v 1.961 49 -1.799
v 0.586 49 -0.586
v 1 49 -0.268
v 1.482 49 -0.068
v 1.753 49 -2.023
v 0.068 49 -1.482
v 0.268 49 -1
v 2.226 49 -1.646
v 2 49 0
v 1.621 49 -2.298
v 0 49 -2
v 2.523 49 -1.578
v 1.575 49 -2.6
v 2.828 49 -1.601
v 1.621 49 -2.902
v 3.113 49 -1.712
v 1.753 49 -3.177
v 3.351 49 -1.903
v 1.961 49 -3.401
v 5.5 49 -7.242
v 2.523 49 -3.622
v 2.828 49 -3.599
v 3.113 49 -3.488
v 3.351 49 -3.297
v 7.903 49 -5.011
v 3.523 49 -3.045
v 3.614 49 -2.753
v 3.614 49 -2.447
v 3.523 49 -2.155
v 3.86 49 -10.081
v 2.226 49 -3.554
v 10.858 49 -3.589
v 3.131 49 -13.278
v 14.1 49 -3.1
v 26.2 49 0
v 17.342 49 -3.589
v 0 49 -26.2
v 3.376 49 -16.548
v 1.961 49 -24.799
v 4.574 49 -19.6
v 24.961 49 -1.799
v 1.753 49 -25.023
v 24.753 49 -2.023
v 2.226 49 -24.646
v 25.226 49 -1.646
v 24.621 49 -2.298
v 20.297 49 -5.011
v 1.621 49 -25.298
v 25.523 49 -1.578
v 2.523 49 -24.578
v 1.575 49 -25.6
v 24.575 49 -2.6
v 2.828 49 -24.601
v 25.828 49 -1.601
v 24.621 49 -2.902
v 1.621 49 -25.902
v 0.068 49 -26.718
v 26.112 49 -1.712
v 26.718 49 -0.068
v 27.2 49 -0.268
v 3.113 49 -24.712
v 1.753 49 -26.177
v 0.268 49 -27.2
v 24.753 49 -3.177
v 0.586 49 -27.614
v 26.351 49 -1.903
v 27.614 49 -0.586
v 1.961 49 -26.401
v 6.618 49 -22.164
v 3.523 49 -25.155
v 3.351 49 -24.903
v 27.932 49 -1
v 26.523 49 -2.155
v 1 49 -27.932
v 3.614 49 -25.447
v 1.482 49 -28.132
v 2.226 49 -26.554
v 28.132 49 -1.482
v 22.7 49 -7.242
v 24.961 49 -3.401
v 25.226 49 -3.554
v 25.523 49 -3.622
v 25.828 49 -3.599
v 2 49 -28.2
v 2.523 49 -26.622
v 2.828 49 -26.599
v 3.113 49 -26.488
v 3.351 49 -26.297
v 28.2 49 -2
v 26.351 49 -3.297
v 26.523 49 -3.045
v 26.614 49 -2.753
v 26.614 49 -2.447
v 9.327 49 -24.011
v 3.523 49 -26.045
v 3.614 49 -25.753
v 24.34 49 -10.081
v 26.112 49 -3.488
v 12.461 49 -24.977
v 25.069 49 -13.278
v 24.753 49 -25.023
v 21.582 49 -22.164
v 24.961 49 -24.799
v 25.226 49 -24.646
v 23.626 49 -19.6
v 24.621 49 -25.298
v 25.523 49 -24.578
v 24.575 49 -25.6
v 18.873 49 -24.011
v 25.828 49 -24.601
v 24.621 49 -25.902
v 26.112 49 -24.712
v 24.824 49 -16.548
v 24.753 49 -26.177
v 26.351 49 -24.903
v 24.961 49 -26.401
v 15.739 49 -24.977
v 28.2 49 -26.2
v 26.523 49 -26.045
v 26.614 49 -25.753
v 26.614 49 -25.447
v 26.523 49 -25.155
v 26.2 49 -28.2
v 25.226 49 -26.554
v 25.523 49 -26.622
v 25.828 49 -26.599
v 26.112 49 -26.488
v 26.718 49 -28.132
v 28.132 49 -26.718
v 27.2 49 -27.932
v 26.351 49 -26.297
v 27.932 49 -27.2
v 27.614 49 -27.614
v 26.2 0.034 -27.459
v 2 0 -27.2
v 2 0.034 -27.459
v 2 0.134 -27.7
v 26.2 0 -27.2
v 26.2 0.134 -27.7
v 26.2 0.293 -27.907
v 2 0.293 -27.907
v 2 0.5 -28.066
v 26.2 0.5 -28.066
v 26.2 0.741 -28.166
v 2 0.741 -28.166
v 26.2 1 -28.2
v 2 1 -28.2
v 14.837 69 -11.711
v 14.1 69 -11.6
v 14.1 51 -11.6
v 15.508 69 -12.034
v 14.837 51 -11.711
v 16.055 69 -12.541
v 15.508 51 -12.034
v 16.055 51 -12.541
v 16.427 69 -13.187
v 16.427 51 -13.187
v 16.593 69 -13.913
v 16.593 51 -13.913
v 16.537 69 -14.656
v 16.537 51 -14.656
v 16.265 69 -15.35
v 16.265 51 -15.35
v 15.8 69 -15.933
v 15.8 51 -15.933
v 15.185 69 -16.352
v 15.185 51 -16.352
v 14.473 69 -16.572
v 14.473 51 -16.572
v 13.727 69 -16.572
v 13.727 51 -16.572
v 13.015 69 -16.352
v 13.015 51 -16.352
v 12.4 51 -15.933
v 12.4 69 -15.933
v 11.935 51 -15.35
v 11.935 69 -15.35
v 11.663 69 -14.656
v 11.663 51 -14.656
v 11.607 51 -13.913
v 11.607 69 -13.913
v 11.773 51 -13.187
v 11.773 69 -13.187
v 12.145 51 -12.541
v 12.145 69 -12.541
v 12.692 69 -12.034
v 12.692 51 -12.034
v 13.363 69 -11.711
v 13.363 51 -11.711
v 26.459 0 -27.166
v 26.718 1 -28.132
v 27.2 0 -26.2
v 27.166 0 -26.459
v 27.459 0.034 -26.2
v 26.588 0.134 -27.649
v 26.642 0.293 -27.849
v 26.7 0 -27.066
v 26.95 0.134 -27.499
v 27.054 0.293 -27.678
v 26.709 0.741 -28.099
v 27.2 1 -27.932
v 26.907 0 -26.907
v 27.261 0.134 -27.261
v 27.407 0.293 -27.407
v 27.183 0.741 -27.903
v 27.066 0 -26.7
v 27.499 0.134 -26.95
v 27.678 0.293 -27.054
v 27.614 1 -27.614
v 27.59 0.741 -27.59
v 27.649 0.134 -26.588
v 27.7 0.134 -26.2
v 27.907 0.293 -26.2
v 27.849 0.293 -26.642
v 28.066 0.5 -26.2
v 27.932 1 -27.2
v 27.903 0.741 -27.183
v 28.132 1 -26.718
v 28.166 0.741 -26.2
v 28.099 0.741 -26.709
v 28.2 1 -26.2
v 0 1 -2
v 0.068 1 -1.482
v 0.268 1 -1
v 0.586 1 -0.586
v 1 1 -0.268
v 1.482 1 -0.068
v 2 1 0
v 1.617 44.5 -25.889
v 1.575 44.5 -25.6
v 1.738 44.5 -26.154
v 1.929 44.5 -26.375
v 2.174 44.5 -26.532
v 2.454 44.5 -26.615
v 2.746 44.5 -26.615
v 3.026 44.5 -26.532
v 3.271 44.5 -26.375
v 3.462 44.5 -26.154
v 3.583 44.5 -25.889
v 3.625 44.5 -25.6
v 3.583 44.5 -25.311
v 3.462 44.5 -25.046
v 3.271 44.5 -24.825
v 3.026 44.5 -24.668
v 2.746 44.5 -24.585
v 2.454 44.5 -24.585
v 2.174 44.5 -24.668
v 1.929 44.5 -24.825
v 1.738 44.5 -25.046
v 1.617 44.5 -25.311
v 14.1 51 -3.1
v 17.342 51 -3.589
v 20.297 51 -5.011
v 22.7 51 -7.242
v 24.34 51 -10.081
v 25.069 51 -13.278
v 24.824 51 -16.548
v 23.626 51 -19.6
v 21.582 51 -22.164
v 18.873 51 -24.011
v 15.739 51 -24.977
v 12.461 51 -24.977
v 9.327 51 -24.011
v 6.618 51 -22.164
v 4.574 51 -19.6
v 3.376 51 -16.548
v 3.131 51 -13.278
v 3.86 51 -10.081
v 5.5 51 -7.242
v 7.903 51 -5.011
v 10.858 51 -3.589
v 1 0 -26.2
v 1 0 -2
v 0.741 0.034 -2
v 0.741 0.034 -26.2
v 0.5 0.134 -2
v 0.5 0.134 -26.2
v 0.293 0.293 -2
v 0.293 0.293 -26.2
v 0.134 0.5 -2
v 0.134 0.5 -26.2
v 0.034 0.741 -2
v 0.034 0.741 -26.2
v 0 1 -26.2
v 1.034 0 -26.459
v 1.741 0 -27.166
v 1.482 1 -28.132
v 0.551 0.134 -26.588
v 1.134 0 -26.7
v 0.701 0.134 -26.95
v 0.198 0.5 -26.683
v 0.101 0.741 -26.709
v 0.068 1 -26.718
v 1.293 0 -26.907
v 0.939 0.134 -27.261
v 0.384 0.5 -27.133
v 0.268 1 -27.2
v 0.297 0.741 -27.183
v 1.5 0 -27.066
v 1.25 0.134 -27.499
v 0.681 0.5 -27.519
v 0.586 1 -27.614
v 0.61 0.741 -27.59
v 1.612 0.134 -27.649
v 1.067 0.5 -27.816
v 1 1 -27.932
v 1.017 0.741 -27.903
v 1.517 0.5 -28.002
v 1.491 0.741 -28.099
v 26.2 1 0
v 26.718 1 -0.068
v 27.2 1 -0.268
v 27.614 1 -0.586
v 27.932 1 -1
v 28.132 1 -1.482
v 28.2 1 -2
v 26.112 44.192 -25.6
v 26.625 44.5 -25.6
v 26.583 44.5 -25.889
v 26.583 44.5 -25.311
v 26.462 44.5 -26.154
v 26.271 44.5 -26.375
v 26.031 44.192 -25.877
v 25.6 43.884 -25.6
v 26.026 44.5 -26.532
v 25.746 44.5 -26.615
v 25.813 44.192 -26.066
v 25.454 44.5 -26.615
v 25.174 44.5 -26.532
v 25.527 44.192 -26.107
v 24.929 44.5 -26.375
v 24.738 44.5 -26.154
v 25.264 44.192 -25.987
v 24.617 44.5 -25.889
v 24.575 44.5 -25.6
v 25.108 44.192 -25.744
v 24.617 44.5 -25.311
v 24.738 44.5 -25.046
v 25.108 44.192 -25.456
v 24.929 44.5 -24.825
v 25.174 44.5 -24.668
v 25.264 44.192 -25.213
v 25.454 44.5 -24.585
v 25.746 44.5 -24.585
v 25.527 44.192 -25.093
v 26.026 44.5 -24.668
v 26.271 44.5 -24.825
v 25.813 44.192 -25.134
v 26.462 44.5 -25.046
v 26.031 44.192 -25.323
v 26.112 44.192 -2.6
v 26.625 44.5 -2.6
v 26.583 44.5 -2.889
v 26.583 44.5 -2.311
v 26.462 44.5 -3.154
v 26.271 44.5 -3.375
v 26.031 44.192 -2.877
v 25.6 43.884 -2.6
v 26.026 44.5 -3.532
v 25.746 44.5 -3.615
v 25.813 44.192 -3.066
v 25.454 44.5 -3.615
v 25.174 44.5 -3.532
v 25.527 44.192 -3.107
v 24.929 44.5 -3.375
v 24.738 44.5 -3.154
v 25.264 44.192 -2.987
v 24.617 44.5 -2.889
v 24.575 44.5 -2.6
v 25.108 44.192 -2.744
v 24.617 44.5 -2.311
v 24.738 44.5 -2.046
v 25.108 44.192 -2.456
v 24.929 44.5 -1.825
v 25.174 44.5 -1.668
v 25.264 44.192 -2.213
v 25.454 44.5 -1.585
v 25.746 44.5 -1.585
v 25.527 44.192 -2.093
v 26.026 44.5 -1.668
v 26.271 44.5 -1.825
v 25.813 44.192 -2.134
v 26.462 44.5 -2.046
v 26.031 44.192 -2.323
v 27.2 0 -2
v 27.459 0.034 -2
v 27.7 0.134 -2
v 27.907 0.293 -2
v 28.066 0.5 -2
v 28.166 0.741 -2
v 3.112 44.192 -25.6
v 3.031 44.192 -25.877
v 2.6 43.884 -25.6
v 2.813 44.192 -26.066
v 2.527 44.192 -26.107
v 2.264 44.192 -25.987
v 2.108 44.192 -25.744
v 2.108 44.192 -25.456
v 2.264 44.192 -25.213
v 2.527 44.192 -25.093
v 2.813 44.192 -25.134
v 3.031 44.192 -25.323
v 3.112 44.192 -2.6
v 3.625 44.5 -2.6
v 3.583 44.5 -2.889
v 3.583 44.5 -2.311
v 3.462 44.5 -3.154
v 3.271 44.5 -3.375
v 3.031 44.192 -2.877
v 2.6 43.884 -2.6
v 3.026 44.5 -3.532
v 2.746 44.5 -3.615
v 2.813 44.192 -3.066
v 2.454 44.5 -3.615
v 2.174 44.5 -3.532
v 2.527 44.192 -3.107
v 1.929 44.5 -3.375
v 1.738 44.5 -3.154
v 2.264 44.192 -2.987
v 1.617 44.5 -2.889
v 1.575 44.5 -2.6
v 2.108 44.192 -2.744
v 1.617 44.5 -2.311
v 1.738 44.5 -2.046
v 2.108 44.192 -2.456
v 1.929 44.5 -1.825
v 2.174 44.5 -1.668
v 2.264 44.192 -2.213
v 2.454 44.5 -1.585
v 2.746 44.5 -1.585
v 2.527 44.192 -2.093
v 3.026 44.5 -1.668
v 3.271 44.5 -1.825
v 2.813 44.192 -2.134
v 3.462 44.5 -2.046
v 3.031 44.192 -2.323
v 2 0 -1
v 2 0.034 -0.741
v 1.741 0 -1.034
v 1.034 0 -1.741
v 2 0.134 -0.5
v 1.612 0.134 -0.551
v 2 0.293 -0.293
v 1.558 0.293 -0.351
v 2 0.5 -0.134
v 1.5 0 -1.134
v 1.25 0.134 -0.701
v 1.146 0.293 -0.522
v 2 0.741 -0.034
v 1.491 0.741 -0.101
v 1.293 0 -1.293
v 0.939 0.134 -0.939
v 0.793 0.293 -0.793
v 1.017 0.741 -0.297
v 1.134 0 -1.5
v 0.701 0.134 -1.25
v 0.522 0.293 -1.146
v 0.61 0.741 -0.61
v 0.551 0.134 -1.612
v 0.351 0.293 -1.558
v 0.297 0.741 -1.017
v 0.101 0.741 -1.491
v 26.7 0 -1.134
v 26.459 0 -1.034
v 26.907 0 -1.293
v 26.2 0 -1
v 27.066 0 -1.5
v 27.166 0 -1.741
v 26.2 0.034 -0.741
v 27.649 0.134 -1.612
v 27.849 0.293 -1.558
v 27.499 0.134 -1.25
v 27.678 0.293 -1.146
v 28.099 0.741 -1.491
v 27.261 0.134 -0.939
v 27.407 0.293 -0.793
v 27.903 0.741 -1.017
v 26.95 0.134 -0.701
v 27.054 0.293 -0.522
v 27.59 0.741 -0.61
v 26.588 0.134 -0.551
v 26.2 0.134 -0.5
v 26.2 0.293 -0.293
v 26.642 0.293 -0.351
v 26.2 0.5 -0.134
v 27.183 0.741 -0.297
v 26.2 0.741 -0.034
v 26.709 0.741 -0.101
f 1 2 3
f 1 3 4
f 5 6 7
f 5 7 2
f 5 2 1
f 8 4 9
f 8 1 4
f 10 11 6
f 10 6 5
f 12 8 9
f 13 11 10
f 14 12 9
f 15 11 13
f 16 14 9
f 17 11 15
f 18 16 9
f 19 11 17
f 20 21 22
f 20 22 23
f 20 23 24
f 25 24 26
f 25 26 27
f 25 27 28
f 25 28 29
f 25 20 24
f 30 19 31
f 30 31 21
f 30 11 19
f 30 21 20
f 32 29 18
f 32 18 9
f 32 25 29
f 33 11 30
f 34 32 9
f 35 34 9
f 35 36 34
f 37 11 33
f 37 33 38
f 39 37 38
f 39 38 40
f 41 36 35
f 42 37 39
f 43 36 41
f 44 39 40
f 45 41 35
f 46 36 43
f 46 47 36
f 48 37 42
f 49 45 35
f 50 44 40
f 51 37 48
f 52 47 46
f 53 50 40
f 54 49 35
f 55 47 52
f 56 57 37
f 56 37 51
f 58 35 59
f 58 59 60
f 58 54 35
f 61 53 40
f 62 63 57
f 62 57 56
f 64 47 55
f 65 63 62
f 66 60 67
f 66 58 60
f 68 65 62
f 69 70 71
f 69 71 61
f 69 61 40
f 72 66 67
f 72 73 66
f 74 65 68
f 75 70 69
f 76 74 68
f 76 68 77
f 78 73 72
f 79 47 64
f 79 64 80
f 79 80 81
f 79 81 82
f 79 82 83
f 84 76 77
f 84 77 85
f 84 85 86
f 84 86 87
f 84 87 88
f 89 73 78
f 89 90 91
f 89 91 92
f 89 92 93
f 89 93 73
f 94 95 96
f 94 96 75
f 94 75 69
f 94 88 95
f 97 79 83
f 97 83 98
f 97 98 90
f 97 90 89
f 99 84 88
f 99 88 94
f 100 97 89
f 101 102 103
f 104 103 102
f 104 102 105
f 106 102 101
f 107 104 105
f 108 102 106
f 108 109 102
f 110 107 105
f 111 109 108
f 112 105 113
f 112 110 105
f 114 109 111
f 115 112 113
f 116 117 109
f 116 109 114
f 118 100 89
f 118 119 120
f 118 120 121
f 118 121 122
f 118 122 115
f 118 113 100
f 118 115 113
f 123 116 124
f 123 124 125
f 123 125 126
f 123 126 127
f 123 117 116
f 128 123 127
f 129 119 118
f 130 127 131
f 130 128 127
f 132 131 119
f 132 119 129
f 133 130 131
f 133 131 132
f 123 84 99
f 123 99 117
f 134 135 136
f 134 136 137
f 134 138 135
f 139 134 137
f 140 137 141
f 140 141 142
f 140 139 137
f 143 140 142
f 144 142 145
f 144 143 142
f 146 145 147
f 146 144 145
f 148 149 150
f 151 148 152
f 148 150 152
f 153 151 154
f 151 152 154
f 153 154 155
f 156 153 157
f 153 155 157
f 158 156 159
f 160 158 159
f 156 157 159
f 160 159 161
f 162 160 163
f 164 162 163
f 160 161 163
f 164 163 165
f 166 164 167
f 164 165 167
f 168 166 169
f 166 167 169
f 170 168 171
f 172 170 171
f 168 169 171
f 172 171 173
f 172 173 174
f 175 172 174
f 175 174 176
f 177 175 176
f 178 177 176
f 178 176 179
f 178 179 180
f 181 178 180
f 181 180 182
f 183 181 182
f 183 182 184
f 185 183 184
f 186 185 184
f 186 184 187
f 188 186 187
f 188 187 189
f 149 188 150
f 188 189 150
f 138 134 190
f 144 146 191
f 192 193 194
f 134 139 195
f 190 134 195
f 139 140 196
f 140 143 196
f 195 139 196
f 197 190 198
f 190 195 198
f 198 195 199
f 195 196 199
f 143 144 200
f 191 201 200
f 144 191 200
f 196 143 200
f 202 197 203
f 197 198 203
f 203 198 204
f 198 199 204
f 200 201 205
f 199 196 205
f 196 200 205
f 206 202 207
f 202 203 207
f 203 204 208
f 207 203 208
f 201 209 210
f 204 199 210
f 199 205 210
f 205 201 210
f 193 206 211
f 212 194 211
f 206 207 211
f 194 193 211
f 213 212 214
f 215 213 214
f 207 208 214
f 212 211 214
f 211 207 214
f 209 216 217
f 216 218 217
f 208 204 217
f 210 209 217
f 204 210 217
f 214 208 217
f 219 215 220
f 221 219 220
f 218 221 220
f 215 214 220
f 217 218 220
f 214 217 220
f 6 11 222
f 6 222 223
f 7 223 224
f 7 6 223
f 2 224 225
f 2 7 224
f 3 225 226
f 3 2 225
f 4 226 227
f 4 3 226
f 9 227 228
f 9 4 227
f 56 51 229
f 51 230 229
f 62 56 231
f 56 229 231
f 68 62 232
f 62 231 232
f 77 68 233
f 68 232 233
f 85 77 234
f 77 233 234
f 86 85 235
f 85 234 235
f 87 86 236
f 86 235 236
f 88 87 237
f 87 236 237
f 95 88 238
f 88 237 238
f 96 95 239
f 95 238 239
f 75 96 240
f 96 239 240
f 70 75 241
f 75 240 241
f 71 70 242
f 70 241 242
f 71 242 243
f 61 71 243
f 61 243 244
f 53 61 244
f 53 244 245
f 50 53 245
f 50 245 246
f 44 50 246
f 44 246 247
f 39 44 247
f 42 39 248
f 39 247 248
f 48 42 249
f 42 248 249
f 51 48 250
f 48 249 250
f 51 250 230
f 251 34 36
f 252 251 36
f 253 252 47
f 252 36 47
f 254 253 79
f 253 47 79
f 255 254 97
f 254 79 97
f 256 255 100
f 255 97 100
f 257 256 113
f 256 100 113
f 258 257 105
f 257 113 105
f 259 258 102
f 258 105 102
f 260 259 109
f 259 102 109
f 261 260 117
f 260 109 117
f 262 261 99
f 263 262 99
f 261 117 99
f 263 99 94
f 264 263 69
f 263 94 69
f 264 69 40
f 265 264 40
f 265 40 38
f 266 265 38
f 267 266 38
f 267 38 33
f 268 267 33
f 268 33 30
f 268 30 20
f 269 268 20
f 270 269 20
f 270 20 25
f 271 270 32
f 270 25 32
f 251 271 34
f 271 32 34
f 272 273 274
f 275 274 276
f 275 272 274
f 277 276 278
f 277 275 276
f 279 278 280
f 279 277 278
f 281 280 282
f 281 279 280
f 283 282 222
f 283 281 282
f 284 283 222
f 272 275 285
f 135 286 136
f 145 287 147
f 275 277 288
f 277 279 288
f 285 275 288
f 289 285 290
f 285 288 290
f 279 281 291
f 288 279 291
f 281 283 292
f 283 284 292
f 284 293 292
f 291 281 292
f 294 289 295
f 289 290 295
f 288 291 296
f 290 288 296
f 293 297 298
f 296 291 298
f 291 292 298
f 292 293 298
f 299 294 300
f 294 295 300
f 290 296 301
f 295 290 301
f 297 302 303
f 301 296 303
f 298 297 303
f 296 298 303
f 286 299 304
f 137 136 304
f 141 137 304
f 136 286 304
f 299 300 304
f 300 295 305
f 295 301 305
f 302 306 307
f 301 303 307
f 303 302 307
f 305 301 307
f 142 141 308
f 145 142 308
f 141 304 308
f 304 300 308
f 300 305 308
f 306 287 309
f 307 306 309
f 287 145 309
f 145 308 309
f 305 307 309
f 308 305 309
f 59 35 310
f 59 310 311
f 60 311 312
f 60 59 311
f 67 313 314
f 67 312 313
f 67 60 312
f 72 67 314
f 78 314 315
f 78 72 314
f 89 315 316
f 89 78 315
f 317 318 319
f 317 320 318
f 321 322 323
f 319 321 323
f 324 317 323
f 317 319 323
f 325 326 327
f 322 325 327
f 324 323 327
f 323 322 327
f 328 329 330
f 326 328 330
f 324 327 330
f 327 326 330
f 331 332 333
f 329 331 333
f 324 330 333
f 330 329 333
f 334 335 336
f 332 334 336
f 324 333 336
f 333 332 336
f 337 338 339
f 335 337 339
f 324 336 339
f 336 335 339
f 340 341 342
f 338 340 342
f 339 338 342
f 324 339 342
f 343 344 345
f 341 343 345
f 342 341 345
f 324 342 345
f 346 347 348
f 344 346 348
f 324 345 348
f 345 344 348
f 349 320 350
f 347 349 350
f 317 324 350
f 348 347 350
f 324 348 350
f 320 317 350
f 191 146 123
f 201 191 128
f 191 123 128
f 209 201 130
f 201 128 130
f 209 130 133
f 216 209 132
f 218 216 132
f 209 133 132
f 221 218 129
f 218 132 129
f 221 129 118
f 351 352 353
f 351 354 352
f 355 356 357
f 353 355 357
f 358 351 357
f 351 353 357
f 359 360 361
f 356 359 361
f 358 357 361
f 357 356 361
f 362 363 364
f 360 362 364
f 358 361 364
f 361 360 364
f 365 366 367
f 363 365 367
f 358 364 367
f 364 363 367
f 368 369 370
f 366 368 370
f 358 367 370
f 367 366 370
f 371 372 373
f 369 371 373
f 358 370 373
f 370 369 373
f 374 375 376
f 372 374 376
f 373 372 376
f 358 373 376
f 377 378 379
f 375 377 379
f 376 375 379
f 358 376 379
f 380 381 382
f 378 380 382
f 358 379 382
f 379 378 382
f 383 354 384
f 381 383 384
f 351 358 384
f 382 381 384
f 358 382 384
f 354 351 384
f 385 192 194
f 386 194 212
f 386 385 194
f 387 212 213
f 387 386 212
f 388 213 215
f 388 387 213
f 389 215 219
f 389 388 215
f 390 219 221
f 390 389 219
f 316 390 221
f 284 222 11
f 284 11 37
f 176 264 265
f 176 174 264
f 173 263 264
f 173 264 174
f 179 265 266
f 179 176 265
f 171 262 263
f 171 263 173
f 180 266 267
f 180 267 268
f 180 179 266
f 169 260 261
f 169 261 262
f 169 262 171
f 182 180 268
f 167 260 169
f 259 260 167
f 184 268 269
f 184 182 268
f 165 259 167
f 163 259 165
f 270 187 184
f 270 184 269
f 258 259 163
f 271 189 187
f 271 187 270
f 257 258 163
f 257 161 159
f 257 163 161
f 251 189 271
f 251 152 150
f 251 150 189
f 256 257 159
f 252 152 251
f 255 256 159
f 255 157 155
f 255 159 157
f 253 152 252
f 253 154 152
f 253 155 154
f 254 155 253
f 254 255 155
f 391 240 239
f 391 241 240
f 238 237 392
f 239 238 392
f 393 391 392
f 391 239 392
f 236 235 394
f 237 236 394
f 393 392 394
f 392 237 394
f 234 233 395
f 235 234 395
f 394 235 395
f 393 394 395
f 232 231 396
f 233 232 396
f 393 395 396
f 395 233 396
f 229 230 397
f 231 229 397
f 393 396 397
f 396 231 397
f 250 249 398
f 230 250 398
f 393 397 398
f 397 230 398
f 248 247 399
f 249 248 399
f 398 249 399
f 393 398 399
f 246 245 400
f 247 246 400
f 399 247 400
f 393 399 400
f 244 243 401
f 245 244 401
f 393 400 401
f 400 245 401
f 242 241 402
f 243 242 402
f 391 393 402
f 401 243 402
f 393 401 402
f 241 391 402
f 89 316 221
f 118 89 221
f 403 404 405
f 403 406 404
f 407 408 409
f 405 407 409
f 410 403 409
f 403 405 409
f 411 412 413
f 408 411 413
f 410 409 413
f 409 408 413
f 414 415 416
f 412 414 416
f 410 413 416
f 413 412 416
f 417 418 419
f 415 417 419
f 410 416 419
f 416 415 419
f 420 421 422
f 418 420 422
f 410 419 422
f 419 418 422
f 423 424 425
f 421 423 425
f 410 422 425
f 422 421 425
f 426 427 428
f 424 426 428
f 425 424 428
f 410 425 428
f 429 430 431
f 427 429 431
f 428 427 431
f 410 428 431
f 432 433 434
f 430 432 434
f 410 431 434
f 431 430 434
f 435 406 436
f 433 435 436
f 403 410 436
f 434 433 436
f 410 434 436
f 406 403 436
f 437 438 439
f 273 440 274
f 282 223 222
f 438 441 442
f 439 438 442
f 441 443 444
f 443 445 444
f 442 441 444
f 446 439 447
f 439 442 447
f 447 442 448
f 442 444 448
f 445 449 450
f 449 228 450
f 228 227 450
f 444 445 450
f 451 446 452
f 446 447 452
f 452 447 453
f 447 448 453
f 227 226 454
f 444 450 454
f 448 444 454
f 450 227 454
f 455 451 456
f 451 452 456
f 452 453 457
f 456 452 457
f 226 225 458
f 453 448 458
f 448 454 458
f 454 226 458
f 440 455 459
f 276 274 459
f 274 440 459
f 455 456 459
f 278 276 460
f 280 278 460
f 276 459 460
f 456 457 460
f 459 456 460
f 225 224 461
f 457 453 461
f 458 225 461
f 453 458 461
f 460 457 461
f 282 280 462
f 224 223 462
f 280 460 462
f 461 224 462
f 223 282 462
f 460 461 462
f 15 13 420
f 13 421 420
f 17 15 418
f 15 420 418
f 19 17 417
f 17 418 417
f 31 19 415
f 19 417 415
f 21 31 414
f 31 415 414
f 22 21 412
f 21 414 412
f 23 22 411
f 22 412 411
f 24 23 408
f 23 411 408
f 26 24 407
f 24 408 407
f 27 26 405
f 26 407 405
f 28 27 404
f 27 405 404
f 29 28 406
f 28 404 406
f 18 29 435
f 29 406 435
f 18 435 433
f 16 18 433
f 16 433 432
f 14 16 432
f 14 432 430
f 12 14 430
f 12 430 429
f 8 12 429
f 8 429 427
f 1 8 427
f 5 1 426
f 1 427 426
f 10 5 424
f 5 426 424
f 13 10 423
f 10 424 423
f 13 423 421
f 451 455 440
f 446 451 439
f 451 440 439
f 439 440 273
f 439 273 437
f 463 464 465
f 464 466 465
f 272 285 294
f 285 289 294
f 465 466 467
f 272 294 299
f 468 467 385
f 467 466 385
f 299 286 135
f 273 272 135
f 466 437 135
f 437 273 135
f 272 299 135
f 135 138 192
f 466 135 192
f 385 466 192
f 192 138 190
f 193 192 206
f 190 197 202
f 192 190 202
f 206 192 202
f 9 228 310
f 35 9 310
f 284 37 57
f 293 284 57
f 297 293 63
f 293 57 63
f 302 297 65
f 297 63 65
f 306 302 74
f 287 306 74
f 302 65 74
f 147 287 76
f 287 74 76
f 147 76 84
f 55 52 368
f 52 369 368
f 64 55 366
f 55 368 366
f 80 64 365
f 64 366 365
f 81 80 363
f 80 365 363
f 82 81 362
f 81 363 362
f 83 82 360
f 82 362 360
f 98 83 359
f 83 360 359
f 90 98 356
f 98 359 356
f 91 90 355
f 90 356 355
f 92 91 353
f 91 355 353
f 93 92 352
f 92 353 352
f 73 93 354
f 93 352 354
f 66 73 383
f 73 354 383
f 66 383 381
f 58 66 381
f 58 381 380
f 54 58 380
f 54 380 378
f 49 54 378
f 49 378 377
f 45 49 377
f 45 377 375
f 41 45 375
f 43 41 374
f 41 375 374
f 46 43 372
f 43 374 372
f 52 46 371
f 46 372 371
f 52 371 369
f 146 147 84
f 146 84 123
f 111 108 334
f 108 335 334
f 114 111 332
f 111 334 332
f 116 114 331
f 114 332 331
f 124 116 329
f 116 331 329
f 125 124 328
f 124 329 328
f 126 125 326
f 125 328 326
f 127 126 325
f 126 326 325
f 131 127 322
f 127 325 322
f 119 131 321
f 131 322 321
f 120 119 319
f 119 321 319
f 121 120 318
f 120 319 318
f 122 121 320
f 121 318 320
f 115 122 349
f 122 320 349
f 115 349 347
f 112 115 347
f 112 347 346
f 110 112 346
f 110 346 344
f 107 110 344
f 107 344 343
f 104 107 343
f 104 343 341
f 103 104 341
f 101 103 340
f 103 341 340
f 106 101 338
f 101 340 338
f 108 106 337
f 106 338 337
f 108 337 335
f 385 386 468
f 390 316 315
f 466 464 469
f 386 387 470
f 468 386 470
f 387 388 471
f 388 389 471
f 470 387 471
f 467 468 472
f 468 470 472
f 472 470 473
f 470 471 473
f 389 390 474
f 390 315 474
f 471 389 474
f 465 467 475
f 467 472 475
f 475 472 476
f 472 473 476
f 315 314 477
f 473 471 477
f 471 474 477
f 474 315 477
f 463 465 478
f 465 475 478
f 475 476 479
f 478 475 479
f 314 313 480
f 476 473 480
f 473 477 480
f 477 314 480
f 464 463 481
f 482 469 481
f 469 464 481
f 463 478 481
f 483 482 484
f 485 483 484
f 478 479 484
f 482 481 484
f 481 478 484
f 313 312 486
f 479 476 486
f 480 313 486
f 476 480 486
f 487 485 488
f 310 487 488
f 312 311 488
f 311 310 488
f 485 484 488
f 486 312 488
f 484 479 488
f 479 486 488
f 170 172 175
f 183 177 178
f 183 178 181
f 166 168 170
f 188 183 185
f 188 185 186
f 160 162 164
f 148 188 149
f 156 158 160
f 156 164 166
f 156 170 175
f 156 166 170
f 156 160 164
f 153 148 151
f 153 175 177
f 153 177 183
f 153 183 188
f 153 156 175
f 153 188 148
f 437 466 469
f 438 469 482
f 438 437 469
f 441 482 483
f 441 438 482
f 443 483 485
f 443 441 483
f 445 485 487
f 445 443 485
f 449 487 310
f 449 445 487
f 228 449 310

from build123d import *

# Parameters (mm, degrees)
SKETCH1_W                     = 28.2
SKETCH1_H                     = 28.2
BOSS_EXTRUDE1_DEPTH           = 49
SKETCH2_R                     = 11
BOSS_EXTRUDE2_DEPTH           = 2
SKETCH3_R                     = 2.5
BOSS_EXTRUDE3_DEPTH           = 18
FILLET1_R                     = 2
TAP_DRILL_FOR_M2_5_TAP1_D     = 2.05
TAP_DRILL_FOR_M2_5_TAP1_DEPTH = 4.5
TAP_DRILL_FOR_M2_5_TAP1_TIP   = 0.615882135
FILLET2_R                     = 1


with BuildPart() as part:
    # Sketch1 → Boss-Extrude1 (new body)
    with BuildSketch(Plane(origin=(0, 0, 0), x_dir=(1, 0, 0), z_dir=(0, 1, 0))):
        with Locations((14.1, 14.1)):
            Rectangle(SKETCH1_W, SKETCH1_H)
    extrude(amount=BOSS_EXTRUDE1_DEPTH)

    # Sketch2 → Boss-Extrude2 (add)
    with BuildSketch(Plane(origin=(0, 49, 0), x_dir=(1, 0, 0), z_dir=(0, 1, 0))):
        with Locations(Location((14.1, 14.1, 0), (0, 0, 270))):
            Circle(SKETCH2_R)
    extrude(amount=BOSS_EXTRUDE2_DEPTH)

    # Sketch3 → Boss-Extrude3 (add)
    with BuildSketch(Plane(origin=(0, 51, 0), x_dir=(1, 0, 0), z_dir=(0, 1, 0))):
        with Locations(Location((14.1, 14.1, 0), (0, 0, 270))):
            Circle(SKETCH3_R)
    extrude(amount=BOSS_EXTRUDE3_DEPTH)

    # Fillet1
    fillet1_edges = [part.edges().sort_by_distance(p)[0] for p in [
        (0, 24.5, -28.2),
        (28.2, 24.5, -28.2),
        (28.2, 24.5, 0),
        (0, 24.5, 0),
    ]]
    fillet(fillet1_edges, radius=FILLET1_R)

    # Tap Drill for M2.5 Tap1
    with Locations(Plane(origin=(0, 49, 0), x_dir=(1, 0, 0), z_dir=(0, 1, 0))):
        with Locations((2.6, 2.6), (25.6, 2.6), (25.6, 25.6), (2.6, 25.6)):
            Hole(TAP_DRILL_FOR_M2_5_TAP1_D / 2, depth=TAP_DRILL_FOR_M2_5_TAP1_DEPTH)
            with Locations((0, 0, -(TAP_DRILL_FOR_M2_5_TAP1_DEPTH + TAP_DRILL_FOR_M2_5_TAP1_TIP / 2))):  # 118° drill point
                Cone(0, TAP_DRILL_FOR_M2_5_TAP1_D / 2, TAP_DRILL_FOR_M2_5_TAP1_TIP, mode=Mode.SUBTRACT)

    # Fillet2
    fillet2_edges = [part.edges().sort_by_distance(p)[0] for p in [
        (14.1, 0, -28.2),
        (0, 0, -14.1),
        (28.2, 0, -14.1),
        (14.1, 0, 0),
        (0.585786438, 0, -0.585786438),
        (27.614213562, 0, -0.585786438),
        (0.585786438, 0, -27.614213562),
        (27.614213562, 0, -27.614213562),
    ]]
    fillet(fillet2_edges, radius=FILLET2_R)


solid = part.part
